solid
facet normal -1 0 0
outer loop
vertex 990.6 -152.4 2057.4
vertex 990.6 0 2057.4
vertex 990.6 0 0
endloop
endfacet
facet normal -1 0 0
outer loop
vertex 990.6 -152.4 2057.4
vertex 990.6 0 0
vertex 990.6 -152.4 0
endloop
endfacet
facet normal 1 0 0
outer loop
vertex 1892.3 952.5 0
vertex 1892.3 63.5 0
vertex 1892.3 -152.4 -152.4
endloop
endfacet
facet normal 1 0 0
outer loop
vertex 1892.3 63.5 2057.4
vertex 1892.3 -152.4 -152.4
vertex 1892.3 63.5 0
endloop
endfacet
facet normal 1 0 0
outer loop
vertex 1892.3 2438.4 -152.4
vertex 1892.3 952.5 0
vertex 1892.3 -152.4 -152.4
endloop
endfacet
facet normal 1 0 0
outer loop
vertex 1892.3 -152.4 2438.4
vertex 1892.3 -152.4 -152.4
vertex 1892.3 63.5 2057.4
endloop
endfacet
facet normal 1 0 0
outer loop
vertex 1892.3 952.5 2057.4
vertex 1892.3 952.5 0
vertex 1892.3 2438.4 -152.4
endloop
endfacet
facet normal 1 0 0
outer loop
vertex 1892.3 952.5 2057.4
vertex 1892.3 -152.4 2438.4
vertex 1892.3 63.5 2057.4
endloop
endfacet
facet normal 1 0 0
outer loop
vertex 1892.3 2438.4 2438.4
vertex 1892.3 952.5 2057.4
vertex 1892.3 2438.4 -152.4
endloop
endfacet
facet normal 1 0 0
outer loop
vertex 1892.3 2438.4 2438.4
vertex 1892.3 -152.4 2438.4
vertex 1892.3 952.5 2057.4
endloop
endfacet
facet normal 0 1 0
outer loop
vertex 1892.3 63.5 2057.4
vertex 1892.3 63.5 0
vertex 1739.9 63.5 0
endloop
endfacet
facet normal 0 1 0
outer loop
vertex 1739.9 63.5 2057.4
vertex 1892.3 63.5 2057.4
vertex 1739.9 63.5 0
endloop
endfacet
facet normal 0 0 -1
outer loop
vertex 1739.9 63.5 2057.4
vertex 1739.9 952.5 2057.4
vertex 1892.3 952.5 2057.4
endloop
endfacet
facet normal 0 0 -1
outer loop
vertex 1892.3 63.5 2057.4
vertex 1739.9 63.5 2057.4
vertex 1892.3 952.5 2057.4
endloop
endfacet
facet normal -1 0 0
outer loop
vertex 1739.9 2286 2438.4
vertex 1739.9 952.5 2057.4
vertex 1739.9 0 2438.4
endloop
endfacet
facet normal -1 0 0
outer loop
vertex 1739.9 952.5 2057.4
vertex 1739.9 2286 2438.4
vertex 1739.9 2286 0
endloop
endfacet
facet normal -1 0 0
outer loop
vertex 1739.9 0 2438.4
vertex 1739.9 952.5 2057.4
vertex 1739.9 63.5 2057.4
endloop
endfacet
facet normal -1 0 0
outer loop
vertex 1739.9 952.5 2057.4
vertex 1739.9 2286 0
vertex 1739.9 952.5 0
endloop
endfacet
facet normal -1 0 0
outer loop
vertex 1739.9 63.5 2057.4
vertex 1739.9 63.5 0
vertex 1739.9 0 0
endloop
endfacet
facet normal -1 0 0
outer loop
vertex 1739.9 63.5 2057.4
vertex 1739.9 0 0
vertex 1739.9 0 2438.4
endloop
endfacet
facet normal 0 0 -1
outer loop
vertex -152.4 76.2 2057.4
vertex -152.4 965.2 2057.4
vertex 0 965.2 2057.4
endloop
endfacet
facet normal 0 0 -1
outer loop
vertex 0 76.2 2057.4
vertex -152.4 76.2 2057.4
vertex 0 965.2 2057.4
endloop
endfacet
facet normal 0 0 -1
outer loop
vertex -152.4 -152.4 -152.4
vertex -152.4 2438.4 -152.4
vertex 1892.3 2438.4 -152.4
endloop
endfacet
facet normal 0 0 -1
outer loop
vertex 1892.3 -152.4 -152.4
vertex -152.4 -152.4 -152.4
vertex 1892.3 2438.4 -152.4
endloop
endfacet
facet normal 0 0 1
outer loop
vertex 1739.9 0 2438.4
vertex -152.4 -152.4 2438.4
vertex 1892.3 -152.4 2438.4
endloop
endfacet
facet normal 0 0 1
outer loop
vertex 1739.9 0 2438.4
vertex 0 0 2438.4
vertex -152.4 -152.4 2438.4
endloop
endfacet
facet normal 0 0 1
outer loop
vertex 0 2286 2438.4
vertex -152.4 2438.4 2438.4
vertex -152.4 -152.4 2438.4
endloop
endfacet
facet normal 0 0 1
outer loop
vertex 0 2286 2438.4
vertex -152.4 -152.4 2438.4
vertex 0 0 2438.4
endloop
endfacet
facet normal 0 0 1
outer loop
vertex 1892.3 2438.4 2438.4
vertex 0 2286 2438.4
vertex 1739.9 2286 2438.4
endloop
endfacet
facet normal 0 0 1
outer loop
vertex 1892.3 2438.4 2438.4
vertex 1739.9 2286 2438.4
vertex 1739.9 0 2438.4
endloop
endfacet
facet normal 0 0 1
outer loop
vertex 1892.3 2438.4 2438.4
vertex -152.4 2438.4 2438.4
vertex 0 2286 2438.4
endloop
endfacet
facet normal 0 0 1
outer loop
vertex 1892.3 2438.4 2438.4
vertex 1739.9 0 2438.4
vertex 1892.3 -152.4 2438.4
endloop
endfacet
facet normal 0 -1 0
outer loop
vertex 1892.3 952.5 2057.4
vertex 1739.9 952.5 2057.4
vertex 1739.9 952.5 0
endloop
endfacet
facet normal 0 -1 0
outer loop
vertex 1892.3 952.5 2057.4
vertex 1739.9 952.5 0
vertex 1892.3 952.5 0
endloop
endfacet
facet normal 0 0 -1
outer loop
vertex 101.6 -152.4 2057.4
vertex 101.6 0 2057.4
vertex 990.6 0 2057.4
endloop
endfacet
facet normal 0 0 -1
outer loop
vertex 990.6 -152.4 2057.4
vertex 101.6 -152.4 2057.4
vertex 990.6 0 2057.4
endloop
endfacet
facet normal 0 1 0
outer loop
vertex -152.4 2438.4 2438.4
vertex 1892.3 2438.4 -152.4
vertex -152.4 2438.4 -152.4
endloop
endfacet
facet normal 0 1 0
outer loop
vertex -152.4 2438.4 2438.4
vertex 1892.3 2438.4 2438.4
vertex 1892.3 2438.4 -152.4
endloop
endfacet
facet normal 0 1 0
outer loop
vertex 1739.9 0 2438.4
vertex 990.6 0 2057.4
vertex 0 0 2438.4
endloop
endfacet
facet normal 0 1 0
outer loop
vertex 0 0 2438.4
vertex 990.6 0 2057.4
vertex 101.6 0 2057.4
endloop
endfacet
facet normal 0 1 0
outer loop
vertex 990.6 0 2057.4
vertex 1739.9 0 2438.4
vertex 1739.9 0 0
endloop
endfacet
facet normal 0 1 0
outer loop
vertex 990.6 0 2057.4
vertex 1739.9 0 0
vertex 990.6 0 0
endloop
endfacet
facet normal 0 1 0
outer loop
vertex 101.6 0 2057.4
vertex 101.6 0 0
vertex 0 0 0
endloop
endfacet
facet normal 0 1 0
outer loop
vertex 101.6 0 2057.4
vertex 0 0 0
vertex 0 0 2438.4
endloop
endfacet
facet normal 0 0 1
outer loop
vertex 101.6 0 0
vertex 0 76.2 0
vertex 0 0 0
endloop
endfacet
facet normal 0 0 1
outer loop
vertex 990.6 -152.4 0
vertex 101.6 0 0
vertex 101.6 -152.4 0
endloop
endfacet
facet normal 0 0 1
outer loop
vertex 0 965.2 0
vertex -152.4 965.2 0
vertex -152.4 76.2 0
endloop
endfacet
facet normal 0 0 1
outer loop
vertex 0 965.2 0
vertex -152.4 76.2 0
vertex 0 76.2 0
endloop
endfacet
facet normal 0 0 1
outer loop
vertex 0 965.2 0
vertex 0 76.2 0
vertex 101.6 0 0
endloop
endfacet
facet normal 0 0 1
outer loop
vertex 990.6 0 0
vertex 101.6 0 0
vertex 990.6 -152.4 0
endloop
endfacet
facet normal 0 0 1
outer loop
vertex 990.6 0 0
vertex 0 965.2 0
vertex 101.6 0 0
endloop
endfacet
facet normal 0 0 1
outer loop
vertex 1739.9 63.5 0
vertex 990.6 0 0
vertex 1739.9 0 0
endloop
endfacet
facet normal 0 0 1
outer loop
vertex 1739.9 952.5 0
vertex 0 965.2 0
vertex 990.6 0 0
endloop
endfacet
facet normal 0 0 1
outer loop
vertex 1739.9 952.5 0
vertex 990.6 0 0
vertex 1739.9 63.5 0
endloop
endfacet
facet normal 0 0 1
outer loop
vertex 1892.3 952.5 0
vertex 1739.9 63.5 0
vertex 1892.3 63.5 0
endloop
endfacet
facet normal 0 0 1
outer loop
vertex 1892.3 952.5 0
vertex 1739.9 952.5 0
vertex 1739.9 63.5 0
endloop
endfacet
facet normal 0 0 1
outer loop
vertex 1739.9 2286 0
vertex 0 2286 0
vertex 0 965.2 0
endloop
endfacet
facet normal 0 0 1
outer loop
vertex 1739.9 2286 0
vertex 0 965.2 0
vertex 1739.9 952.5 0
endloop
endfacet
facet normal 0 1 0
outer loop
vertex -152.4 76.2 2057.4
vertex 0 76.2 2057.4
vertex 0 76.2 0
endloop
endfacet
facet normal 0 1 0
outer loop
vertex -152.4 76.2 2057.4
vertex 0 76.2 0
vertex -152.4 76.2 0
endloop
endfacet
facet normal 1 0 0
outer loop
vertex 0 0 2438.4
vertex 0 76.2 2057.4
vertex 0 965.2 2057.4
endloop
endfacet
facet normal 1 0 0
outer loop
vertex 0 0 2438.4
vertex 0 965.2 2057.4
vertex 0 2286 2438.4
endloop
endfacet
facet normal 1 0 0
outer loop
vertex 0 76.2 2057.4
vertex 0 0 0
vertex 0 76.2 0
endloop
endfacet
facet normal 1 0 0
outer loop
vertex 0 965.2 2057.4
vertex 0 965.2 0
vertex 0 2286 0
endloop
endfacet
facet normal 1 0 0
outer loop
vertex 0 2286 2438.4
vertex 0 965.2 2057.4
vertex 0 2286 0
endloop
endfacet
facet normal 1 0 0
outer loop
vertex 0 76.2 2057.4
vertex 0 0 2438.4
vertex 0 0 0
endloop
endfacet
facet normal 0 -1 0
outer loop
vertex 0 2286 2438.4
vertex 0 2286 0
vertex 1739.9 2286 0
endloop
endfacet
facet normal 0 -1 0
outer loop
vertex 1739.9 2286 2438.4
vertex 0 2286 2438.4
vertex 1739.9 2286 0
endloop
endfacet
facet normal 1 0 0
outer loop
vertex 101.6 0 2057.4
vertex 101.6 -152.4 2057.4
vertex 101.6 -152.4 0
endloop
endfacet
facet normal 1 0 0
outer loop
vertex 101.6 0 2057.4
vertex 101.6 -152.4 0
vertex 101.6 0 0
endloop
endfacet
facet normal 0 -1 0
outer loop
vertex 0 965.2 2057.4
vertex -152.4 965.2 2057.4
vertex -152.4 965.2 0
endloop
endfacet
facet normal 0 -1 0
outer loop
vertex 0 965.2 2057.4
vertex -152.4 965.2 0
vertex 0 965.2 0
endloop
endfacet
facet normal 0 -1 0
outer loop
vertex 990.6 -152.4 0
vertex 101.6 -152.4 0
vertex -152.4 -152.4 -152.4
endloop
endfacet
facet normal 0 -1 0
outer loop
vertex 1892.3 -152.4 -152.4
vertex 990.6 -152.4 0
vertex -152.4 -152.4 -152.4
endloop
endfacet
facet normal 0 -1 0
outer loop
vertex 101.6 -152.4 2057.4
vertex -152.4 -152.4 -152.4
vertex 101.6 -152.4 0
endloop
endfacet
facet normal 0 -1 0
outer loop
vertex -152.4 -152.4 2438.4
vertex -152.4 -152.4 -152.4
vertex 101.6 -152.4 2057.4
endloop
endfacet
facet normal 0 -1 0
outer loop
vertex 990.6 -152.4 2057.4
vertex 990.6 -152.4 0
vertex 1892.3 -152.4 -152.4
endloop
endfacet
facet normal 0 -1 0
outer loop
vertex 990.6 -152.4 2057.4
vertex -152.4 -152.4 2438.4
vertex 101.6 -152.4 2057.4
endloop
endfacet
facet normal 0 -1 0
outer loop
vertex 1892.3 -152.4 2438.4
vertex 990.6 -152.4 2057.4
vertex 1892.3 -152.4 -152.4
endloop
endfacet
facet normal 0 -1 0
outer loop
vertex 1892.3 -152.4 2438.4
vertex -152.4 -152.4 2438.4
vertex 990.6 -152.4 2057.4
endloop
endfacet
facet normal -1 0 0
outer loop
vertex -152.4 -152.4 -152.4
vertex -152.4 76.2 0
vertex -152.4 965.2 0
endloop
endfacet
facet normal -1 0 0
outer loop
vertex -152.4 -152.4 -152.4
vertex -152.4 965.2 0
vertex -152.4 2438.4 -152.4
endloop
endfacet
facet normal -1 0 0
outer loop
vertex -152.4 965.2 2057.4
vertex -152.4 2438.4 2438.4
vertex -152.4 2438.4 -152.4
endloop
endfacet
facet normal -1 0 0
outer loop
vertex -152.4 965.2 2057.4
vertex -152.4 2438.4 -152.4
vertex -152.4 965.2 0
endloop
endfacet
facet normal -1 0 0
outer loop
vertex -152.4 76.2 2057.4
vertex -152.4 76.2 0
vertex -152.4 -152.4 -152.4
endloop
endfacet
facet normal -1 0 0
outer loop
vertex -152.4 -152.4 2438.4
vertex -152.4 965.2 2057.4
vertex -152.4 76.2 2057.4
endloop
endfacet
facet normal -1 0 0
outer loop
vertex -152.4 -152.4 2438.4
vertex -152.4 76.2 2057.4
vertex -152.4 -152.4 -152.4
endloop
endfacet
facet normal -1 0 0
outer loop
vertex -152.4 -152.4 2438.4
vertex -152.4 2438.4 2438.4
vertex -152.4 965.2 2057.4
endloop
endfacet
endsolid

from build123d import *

# Parameters (mm, degrees)
F1_DEPTH = 2438.4
F2_START = 2057.4
F0_W     = 152.4
F0_H     = 889
F0_W_2   = 889
F0_H_2   = 152.4
F2_DEPTH = 381
F0_W_3   = 101.6
F0_H_3   = 76.2
F3_DEPTH = 152.4


with BuildPart() as f1:
    # F0 (on Top) → F1 (new body)
    with BuildSketch(Plane.XY):
        Polygon((-152.4, 965.2), (0, 965.2), (0, 2286), (1739.9, 2286), (1739.9, 952.5), (1892.3, 952.5), (1892.3, 2438.4), (-152.4, 2438.4), align=None)
    extrude(amount=F1_DEPTH)



with BuildPart() as f1b:
    # F0 (on Top) → F1, piece 2 (new body)
    with BuildSketch(Plane.XY):
        Polygon((1739.9, 0), (990.6, 0), (990.6, -152.4), (1892.3, -152.4), (1892.3, 63.5), (1739.9, 63.5), align=None)
    extrude(amount=F1_DEPTH)


with BuildPart() as f1c:
    # F0 (on Top) → F1, piece 3 (new body)
    with BuildSketch(Plane.XY):
        Polygon((101.6, 0), (0, 0), (0, 76.2), (-152.4, 76.2), (-152.4, -152.4), (101.6, -152.4), align=None)
    extrude(amount=F1_DEPTH)


with BuildPart() as f1_1:
    add(f1.part)

    add(f1b.part)  # F2 merges F1b

    add(f1c.part)  # F2 merges F1c
    # F0 (on Top) → F2 (join)
    with BuildSketch(Plane.XY.offset(F2_START)):
        with Locations((-76.2, 520.7)):
            Rectangle(F0_W, F0_H)
        with Locations((1816.1, 508)):
            Rectangle(F0_W, F0_H)
        with Locations((546.1, -76.2)):
            Rectangle(F0_W_2, F0_H_2)
    extrude(amount=F2_DEPTH)

    # F0 (on Top) → F3 (join)
    with BuildSketch(Plane.XY):
        Polygon((101.6, 0), (0, 0), (0, 76.2), (-152.4, 76.2), (-152.4, -152.4), (101.6, -152.4), align=None)
        with Locations((546.1, -76.2)):
            Rectangle(F0_W_2, F0_H_2)
        with Locations((-76.2, 520.7)):
            Rectangle(F0_W, F0_H)
        Polygon((1739.9, 0), (990.6, 0), (990.6, -152.4), (1892.3, -152.4), (1892.3, 63.5), (1739.9, 63.5), align=None)
        Polygon((-152.4, 965.2), (0, 965.2), (0, 2286), (1739.9, 2286), (1739.9, 952.5), (1892.3, 952.5), (1892.3, 2438.4), (-152.4, 2438.4), align=None)
        with Locations((1816.1, 508)):
            Rectangle(F0_W, F0_H)
        with BuildLine():
            ThreePointArc((850.9, 952.5), (1111.2820715252, 323.8820715252), (1739.9, 63.5))
            Line((1739.9, 63.5), (1739.9, 952.5))
            Line((1739.9, 952.5), (850.9, 952.5))
        make_face()
        with BuildLine():
            ThreePointArc((582.8375456676, 747.4833942235), (882.0297463893, 425.7351417851), (990.6, 0))
            Line((990.6, 0), (1739.9, 0))
            Line((1739.9, 0), (1739.9, 63.5))
            ThreePointArc((1739.9, 63.5), (1111.2820715252, 323.8820715252), (850.9, 952.5))
            Line((850.9, 952.5), (1739.9, 952.5))
            Line((1739.9, 952.5), (1739.9, 2286))
            Line((1739.9, 2286), (0, 2286))
            Line((0, 2286), (0, 965.2))
            ThreePointArc((0, 965.2), (311.0868548616, 908.9940734253), (582.8375456676, 747.4833942235))
        make_face()
        with BuildLine():
            Line((101.6, 889), (101.6, 76.2))
            Line((101.6, 76.2), (889, 76.2))
            ThreePointArc((889, 76.2), (808.8459612616, 445.1027120404), (582.8375456676, 747.4833942235))
            ThreePointArc((582.8375456676, 747.4833942235), (352.4069601659, 852.8873716572), (101.6, 889))
        make_face()
        with BuildLine():
            Line((0, 965.2), (0, 76.2))
            Line((0, 76.2), (101.6, 76.2))
            Line((101.6, 76.2), (101.6, 889))
            ThreePointArc((101.6, 889), (352.4069601659, 852.8873716572), (582.8375456676, 747.4833942235))
            ThreePointArc((582.8375456676, 747.4833942235), (311.0868548616, 908.9940734253), (0, 965.2))
        make_face()
        with BuildLine():
            Line((101.6, 76.2), (101.6, 0))
            Line((101.6, 0), (990.6, 0))
            ThreePointArc((990.6, 0), (882.0297463893, 425.7351417851), (582.8375456676, 747.4833942235))
            ThreePointArc((582.8375456676, 747.4833942235), (808.8459612616, 445.1027120404), (889, 76.2))
            Line((889, 76.2), (101.6, 76.2))
        make_face()
        with Locations((50.8, 38.1)):
            Rectangle(F0_W_3, F0_H_3)
    extrude(amount=-F3_DEPTH)


solid = f1_1.part
